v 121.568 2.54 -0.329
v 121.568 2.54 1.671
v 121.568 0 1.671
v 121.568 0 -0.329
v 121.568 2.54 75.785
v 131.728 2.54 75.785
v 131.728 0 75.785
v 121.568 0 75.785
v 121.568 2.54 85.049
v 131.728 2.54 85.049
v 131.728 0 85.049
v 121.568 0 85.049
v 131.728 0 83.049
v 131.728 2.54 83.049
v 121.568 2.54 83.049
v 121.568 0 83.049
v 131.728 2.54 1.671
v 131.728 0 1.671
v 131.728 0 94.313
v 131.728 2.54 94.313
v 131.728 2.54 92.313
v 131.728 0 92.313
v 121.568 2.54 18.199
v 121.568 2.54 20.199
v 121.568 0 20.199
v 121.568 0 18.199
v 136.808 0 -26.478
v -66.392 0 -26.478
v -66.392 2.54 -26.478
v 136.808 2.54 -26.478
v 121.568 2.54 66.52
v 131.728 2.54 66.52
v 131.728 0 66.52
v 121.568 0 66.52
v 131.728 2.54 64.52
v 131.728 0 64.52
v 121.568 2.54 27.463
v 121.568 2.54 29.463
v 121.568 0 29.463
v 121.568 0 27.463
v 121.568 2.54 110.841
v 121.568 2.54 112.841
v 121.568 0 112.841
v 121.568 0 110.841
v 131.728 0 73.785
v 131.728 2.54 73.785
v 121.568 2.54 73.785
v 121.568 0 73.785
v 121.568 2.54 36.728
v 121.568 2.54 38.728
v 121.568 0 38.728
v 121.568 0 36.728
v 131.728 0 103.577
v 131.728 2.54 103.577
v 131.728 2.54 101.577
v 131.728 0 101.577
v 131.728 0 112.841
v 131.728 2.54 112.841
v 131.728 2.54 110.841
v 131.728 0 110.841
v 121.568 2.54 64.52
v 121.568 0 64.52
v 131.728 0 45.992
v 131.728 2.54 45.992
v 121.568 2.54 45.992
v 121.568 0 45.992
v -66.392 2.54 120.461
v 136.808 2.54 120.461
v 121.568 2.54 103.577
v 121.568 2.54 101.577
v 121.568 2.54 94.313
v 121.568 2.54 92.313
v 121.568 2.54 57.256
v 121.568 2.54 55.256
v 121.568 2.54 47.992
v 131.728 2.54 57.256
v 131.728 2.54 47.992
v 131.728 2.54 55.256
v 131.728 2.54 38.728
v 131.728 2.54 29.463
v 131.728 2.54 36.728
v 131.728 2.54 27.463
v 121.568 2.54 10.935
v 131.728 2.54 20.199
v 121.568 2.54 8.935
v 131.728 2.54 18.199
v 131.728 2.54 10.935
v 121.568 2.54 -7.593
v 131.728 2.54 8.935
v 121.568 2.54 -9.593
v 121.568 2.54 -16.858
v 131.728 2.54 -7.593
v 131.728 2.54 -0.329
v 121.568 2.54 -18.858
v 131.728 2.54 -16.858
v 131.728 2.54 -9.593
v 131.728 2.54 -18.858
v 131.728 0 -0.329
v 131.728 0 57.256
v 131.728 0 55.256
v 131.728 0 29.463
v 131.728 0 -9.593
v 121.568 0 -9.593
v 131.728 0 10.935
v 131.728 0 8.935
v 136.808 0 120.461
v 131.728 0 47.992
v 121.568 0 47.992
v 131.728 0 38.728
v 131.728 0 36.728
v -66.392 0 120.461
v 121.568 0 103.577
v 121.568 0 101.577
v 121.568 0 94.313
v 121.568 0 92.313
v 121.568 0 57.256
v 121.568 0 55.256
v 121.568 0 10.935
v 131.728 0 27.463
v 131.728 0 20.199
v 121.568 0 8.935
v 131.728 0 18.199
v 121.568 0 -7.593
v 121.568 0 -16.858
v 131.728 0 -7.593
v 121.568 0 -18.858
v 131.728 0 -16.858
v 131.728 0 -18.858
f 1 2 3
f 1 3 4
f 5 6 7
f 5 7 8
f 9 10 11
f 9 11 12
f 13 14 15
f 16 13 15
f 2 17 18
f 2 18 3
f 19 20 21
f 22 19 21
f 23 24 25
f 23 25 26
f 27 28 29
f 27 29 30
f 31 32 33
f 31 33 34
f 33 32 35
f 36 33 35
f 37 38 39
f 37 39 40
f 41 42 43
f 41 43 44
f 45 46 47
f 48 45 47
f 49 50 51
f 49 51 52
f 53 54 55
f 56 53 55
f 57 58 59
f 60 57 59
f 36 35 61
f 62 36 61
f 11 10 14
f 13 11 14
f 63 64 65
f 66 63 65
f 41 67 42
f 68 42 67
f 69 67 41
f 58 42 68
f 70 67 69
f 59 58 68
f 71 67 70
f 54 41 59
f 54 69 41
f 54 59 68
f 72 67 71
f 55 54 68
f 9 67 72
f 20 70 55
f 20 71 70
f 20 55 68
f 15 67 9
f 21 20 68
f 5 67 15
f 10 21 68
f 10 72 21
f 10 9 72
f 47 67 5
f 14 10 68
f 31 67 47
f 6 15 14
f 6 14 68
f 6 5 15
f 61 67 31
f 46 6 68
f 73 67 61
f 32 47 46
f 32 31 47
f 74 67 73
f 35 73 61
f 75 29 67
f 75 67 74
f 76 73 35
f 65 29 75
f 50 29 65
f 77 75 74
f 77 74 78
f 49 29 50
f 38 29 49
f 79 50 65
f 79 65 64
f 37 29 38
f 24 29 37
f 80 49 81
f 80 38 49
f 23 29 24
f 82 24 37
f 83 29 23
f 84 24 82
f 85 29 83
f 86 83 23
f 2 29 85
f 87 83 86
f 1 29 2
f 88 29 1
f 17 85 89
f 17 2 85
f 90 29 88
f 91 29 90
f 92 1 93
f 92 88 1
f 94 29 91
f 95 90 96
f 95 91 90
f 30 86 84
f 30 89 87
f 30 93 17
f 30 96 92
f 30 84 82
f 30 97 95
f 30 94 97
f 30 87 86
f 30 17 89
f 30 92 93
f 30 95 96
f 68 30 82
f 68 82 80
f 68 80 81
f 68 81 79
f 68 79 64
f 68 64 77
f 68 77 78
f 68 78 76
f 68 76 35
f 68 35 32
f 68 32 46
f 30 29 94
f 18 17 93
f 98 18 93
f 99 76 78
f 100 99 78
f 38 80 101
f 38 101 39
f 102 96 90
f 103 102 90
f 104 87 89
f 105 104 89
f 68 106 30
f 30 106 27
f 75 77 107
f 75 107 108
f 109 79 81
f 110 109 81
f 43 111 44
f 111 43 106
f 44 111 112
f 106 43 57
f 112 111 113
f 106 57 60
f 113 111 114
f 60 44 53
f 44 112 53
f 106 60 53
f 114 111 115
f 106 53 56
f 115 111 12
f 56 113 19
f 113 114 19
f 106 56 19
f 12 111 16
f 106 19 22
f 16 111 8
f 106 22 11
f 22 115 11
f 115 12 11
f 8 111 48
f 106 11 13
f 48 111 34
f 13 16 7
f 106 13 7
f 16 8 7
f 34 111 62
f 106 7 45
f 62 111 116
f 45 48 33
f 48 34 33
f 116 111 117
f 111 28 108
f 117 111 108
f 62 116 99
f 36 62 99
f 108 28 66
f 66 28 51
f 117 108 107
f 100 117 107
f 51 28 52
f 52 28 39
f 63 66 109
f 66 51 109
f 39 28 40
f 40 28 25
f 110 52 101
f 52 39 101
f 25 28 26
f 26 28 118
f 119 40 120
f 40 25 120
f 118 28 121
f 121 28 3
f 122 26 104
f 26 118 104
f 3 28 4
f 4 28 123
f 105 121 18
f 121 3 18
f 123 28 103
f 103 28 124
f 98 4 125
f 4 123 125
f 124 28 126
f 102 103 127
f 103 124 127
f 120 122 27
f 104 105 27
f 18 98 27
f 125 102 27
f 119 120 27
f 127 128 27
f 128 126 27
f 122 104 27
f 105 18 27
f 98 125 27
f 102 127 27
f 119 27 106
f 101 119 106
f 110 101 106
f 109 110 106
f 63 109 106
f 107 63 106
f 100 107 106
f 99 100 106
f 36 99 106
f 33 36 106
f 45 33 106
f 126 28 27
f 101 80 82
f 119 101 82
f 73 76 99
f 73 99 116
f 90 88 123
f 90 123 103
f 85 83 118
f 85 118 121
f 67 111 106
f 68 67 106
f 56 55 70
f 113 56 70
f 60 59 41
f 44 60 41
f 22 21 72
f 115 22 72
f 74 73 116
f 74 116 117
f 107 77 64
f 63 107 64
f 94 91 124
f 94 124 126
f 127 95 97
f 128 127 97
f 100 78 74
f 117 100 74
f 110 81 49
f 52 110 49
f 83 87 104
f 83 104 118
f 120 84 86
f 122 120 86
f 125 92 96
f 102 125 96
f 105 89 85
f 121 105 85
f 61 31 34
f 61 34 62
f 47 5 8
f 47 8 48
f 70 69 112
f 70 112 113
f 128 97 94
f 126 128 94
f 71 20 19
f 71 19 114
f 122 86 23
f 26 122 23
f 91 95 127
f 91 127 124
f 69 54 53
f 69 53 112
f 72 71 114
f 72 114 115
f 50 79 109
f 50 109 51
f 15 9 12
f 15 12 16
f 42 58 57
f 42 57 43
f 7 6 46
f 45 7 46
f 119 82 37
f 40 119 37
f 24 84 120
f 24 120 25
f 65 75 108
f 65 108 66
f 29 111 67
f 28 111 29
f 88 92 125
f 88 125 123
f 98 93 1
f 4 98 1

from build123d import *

# Parameters (mm, degrees)
SKETCH1_W           = 203.2
SKETCH1_H           = 146.939
BOSS_EXTRUDE1_DEPTH = 2.54
SKETCH2_W           = 2
SKETCH2_H           = 10.16
CUT_EXTRUDE1_DEPTH  = 2.794
LPATTERN1_COUNT     = 15
LPATTERN1_PITCH     = 9.264214286


with BuildPart() as part:
    # Sketch1 → Boss-Extrude1 (new body)
    with BuildSketch(Plane(origin=(0, 0, 0), x_dir=(1, 0, 0), z_dir=(0, 1, 0))):
        with Locations((35.207920792, -46.991886139)):
            Rectangle(SKETCH1_W, SKETCH1_H)
    extrude(amount=BOSS_EXTRUDE1_DEPTH)

    # Sketch2 → Cut-Extrude1 (cut)
    with BuildSketch(Plane(origin=(0, 2.54, 0), x_dir=(0, 0, -1), z_dir=(0, 1, 0))):
        with Locations((-111.841386139, -126.647920792)):
            Rectangle(SKETCH2_W, SKETCH2_H)
    cut_extrude1 = extrude(amount=-CUT_EXTRUDE1_DEPTH, mode=Mode.SUBTRACT)

    # LPattern1: Cut-Extrude1 ×15
    with Locations(*[(0, 0, -i * LPATTERN1_PITCH) for i in range(1, LPATTERN1_COUNT)]):
        add(cut_extrude1, mode=Mode.SUBTRACT)


solid = part.part
